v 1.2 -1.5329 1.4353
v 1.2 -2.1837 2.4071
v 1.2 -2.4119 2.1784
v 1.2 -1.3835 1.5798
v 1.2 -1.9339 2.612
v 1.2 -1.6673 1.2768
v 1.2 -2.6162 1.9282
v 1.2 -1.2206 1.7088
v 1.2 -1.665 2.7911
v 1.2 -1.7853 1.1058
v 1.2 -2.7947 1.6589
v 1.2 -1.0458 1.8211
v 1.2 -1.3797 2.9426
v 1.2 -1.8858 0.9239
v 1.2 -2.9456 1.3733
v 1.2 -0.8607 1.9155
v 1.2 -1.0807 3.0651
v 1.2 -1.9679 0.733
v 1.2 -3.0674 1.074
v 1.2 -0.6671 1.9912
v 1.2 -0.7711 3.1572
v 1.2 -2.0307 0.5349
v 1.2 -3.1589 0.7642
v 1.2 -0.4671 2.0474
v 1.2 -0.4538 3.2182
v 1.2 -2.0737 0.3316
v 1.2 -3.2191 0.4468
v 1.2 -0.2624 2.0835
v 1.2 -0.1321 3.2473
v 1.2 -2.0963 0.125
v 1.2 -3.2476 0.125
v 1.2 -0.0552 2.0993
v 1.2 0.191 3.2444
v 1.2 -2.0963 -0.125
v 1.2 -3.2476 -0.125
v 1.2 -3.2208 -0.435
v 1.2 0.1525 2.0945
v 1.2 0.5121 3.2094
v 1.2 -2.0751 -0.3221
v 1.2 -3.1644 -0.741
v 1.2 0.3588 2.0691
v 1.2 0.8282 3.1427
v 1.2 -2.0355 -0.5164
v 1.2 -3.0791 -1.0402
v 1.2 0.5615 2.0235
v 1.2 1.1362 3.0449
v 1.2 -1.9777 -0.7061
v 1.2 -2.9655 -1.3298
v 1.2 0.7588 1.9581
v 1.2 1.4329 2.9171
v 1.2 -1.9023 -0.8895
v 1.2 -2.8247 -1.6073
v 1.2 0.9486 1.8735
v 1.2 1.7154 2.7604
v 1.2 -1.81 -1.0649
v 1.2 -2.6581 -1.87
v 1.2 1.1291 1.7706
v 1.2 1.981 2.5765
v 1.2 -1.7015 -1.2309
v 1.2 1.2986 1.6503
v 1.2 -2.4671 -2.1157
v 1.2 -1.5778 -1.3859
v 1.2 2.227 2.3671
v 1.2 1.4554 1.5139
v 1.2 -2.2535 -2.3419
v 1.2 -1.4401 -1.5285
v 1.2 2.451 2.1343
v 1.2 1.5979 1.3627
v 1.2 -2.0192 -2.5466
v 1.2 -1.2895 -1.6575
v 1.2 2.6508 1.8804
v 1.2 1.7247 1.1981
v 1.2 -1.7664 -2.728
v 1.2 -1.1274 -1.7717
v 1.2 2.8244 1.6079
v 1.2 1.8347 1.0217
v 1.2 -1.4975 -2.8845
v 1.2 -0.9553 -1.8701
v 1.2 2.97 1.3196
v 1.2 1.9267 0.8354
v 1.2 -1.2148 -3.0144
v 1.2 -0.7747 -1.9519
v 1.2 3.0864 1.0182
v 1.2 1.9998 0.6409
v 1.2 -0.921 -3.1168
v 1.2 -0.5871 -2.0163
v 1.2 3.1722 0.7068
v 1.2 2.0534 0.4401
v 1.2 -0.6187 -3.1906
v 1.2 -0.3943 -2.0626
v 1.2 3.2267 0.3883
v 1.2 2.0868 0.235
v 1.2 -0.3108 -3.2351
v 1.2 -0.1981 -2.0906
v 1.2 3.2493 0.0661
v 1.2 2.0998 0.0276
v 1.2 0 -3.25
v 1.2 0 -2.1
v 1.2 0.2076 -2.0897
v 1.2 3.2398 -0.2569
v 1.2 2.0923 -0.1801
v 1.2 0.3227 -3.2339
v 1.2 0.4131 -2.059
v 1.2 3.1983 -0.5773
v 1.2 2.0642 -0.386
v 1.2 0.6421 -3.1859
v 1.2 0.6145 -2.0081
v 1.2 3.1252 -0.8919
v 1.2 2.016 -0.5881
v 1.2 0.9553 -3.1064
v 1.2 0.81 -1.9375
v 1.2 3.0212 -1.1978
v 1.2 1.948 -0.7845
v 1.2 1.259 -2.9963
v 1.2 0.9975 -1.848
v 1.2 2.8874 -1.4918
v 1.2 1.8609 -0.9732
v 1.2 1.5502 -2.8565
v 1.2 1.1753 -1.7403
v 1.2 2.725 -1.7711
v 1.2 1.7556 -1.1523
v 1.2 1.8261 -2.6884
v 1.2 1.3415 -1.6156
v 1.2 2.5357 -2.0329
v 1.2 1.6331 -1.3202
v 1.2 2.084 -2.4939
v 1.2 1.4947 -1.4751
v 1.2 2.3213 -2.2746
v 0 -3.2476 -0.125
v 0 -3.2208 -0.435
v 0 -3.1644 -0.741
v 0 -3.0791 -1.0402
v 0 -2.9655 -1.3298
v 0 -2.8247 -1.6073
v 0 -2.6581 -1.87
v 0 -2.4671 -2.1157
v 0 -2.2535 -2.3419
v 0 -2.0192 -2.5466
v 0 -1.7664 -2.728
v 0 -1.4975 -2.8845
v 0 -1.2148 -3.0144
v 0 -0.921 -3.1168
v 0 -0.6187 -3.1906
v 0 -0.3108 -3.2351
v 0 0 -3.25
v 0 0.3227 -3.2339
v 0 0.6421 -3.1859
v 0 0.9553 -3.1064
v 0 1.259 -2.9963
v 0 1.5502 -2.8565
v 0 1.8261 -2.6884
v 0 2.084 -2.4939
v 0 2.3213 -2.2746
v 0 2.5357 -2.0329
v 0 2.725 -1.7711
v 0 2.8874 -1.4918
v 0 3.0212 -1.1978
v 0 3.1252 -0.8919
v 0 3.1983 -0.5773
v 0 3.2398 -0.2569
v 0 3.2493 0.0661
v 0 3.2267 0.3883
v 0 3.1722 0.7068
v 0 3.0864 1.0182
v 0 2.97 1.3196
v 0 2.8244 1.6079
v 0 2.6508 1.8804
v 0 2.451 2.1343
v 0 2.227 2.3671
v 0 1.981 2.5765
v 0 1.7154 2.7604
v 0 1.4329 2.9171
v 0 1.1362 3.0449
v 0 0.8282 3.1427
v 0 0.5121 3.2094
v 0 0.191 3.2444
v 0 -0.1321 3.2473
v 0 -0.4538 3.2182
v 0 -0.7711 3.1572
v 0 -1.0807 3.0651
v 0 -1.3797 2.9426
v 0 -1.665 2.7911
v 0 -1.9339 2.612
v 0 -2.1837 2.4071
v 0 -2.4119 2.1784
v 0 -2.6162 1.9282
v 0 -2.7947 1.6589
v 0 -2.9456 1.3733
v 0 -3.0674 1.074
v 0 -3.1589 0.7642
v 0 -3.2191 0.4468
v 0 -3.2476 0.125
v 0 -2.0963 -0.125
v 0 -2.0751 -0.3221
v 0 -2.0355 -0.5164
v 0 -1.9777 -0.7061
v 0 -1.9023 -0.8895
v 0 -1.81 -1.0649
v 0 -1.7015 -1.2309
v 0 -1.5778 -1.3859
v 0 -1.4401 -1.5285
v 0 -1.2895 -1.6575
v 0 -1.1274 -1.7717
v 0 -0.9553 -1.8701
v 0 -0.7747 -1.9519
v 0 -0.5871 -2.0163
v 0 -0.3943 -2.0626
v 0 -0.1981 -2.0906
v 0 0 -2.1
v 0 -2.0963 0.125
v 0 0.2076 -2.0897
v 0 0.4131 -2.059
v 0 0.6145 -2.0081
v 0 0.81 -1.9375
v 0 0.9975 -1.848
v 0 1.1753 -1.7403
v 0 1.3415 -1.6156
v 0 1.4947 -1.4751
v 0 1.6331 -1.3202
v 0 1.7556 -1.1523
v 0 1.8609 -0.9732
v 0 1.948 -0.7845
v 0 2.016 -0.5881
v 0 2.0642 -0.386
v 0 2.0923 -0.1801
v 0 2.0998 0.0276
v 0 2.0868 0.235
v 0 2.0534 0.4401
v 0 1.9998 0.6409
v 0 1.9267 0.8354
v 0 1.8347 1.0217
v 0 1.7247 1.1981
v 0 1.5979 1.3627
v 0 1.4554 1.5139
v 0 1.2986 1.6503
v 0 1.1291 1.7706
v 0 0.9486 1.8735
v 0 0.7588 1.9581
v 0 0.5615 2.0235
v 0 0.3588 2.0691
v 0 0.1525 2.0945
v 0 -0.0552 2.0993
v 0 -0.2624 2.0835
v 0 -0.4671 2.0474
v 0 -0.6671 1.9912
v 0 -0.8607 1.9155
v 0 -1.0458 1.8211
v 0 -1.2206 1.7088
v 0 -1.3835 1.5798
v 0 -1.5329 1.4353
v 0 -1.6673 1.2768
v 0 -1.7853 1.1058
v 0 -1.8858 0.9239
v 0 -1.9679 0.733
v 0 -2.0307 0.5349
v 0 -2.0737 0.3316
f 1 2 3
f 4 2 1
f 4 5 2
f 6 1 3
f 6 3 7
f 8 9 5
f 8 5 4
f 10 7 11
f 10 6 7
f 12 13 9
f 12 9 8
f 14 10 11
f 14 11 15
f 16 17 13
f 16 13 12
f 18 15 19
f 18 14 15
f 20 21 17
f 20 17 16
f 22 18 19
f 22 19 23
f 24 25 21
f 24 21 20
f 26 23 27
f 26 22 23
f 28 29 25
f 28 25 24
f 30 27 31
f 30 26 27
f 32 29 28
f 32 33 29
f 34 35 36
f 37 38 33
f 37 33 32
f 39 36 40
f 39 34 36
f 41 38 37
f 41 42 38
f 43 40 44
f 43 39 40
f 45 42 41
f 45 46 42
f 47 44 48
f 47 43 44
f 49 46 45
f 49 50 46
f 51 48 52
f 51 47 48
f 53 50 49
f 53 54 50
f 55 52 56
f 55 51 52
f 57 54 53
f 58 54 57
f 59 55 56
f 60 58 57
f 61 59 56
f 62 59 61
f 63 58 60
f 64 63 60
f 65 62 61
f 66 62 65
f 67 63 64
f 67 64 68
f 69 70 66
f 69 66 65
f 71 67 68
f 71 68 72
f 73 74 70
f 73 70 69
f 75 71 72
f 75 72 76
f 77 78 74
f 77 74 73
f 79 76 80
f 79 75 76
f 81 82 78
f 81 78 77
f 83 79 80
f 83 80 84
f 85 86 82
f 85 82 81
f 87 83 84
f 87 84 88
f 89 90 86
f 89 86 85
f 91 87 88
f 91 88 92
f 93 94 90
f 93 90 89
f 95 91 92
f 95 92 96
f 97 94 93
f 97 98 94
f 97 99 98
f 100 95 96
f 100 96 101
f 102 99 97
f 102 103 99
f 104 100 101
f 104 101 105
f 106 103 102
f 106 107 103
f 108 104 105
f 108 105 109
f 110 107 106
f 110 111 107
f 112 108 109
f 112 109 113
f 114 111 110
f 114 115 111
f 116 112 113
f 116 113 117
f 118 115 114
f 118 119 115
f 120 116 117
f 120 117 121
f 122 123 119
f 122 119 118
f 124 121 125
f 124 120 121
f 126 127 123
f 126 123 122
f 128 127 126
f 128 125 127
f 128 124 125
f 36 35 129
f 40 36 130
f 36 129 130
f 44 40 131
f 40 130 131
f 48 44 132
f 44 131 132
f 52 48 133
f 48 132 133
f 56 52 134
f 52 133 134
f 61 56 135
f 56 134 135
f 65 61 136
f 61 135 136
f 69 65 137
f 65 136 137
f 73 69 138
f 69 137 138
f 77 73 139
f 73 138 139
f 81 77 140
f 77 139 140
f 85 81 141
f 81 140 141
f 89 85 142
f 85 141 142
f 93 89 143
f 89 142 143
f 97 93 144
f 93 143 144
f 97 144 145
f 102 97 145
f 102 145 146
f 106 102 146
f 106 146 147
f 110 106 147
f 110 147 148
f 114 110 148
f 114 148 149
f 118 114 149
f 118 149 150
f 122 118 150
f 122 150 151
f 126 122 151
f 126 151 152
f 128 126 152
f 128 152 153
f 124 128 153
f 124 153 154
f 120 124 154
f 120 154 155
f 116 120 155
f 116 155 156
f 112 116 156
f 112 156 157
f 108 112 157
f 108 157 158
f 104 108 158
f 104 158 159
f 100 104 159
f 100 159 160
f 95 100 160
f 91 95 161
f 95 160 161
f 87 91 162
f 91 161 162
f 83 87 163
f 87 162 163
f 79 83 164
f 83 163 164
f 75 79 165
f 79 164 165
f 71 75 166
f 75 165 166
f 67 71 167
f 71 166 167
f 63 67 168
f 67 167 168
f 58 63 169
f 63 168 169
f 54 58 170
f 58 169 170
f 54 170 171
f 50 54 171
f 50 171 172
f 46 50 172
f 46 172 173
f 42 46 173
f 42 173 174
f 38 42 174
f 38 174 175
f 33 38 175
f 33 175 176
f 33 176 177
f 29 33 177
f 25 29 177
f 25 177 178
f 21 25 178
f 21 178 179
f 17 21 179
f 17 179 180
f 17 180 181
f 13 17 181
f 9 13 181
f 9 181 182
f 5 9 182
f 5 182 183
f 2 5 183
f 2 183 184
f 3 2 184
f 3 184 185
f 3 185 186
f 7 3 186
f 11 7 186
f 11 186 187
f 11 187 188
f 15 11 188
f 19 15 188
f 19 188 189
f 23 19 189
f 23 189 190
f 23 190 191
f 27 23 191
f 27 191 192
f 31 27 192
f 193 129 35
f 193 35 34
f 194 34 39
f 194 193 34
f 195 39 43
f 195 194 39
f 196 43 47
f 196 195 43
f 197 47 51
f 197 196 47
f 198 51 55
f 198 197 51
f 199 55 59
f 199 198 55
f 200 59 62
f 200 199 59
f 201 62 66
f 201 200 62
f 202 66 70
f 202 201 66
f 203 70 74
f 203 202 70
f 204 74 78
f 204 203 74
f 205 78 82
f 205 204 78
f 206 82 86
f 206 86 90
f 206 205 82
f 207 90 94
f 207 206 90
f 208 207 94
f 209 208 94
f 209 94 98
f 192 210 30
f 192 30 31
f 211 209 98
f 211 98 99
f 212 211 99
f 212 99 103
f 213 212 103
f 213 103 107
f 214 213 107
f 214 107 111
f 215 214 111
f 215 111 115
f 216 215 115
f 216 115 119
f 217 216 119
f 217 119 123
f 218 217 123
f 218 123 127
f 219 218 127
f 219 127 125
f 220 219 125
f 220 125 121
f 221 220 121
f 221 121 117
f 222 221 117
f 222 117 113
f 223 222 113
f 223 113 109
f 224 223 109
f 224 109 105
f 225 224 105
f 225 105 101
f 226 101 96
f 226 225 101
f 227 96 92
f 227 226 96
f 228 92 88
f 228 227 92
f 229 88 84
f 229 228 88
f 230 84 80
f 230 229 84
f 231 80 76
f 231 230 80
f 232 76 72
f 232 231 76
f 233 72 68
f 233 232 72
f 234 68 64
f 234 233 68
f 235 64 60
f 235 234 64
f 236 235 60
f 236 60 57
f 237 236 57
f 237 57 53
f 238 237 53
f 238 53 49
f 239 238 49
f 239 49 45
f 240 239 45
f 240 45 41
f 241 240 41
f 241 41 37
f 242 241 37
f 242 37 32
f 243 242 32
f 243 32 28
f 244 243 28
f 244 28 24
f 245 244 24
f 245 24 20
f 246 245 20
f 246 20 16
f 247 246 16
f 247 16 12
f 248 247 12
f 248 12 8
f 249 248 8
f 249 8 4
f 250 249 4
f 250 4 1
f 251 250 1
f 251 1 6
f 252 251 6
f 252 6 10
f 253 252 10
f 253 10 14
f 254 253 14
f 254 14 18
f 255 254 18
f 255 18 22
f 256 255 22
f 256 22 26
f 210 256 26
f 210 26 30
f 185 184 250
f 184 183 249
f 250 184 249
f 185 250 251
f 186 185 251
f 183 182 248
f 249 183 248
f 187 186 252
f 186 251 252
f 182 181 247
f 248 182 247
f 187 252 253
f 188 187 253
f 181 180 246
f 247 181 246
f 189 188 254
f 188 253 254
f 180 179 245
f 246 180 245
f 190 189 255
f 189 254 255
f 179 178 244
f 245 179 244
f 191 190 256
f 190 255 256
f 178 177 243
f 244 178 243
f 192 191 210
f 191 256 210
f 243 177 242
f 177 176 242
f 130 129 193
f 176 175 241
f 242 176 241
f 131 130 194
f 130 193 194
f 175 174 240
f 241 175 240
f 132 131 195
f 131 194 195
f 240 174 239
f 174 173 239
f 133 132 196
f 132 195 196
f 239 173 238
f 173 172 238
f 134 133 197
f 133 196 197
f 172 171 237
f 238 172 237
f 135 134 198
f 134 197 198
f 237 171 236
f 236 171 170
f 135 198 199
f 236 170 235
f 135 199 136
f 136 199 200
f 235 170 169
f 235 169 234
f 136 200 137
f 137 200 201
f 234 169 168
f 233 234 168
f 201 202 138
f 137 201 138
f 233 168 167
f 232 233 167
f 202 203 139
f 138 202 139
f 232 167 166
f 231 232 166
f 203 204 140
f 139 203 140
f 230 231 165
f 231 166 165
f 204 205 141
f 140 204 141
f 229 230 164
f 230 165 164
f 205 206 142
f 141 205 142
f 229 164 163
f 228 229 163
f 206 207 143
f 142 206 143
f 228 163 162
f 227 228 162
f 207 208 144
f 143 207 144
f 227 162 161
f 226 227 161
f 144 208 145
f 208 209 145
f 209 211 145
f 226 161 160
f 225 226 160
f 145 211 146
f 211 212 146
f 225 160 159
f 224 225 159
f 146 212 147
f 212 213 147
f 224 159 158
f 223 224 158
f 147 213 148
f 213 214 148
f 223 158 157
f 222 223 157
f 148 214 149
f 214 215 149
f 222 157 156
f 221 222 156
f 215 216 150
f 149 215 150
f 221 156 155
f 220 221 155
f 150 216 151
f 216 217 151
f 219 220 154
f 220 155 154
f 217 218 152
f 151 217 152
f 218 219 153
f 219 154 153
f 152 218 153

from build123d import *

# Parameters (mm, degrees)
SKETCH1_R          = 3.25
SKETCH1_R_2        = 2.1
BASE_EXTRUDE_DEPTH = 1.2
SLIT_BEND_DEPTH    = 5.750263151


with BuildPart() as part:
    # Sketch1 → Base-Extrude (new body)
    with BuildSketch(Plane(origin=(0, 0, 0), x_dir=(0, 0, -1), z_dir=(1, 0, 0))):
        Circle(SKETCH1_R)
        Circle(SKETCH1_R_2, mode=Mode.SUBTRACT)
    extrude(amount=BASE_EXTRUDE_DEPTH)

    # Sketch2 → Slit-bend (cut, through all)
    with BuildSketch(Plane(origin=(0, 0, 0), x_dir=(0, 0, -1), z_dir=(1, 0, 0))):
        with BuildLine():
            Line((-0.125, -2.096276461), (-0.125, -3.247595264))
            ThreePointArc((-0.125, -3.247595264), (0, -3.25), (0.125, -3.247595264))
            Line((0.125, -3.247595264), (0.125, -2.096276461))
            ThreePointArc((0.125, -2.096276461), (0, -2.1), (-0.125, -2.096276461))
        make_face()
    extrude(amount=SLIT_BEND_DEPTH, mode=Mode.SUBTRACT)


solid = part.part
